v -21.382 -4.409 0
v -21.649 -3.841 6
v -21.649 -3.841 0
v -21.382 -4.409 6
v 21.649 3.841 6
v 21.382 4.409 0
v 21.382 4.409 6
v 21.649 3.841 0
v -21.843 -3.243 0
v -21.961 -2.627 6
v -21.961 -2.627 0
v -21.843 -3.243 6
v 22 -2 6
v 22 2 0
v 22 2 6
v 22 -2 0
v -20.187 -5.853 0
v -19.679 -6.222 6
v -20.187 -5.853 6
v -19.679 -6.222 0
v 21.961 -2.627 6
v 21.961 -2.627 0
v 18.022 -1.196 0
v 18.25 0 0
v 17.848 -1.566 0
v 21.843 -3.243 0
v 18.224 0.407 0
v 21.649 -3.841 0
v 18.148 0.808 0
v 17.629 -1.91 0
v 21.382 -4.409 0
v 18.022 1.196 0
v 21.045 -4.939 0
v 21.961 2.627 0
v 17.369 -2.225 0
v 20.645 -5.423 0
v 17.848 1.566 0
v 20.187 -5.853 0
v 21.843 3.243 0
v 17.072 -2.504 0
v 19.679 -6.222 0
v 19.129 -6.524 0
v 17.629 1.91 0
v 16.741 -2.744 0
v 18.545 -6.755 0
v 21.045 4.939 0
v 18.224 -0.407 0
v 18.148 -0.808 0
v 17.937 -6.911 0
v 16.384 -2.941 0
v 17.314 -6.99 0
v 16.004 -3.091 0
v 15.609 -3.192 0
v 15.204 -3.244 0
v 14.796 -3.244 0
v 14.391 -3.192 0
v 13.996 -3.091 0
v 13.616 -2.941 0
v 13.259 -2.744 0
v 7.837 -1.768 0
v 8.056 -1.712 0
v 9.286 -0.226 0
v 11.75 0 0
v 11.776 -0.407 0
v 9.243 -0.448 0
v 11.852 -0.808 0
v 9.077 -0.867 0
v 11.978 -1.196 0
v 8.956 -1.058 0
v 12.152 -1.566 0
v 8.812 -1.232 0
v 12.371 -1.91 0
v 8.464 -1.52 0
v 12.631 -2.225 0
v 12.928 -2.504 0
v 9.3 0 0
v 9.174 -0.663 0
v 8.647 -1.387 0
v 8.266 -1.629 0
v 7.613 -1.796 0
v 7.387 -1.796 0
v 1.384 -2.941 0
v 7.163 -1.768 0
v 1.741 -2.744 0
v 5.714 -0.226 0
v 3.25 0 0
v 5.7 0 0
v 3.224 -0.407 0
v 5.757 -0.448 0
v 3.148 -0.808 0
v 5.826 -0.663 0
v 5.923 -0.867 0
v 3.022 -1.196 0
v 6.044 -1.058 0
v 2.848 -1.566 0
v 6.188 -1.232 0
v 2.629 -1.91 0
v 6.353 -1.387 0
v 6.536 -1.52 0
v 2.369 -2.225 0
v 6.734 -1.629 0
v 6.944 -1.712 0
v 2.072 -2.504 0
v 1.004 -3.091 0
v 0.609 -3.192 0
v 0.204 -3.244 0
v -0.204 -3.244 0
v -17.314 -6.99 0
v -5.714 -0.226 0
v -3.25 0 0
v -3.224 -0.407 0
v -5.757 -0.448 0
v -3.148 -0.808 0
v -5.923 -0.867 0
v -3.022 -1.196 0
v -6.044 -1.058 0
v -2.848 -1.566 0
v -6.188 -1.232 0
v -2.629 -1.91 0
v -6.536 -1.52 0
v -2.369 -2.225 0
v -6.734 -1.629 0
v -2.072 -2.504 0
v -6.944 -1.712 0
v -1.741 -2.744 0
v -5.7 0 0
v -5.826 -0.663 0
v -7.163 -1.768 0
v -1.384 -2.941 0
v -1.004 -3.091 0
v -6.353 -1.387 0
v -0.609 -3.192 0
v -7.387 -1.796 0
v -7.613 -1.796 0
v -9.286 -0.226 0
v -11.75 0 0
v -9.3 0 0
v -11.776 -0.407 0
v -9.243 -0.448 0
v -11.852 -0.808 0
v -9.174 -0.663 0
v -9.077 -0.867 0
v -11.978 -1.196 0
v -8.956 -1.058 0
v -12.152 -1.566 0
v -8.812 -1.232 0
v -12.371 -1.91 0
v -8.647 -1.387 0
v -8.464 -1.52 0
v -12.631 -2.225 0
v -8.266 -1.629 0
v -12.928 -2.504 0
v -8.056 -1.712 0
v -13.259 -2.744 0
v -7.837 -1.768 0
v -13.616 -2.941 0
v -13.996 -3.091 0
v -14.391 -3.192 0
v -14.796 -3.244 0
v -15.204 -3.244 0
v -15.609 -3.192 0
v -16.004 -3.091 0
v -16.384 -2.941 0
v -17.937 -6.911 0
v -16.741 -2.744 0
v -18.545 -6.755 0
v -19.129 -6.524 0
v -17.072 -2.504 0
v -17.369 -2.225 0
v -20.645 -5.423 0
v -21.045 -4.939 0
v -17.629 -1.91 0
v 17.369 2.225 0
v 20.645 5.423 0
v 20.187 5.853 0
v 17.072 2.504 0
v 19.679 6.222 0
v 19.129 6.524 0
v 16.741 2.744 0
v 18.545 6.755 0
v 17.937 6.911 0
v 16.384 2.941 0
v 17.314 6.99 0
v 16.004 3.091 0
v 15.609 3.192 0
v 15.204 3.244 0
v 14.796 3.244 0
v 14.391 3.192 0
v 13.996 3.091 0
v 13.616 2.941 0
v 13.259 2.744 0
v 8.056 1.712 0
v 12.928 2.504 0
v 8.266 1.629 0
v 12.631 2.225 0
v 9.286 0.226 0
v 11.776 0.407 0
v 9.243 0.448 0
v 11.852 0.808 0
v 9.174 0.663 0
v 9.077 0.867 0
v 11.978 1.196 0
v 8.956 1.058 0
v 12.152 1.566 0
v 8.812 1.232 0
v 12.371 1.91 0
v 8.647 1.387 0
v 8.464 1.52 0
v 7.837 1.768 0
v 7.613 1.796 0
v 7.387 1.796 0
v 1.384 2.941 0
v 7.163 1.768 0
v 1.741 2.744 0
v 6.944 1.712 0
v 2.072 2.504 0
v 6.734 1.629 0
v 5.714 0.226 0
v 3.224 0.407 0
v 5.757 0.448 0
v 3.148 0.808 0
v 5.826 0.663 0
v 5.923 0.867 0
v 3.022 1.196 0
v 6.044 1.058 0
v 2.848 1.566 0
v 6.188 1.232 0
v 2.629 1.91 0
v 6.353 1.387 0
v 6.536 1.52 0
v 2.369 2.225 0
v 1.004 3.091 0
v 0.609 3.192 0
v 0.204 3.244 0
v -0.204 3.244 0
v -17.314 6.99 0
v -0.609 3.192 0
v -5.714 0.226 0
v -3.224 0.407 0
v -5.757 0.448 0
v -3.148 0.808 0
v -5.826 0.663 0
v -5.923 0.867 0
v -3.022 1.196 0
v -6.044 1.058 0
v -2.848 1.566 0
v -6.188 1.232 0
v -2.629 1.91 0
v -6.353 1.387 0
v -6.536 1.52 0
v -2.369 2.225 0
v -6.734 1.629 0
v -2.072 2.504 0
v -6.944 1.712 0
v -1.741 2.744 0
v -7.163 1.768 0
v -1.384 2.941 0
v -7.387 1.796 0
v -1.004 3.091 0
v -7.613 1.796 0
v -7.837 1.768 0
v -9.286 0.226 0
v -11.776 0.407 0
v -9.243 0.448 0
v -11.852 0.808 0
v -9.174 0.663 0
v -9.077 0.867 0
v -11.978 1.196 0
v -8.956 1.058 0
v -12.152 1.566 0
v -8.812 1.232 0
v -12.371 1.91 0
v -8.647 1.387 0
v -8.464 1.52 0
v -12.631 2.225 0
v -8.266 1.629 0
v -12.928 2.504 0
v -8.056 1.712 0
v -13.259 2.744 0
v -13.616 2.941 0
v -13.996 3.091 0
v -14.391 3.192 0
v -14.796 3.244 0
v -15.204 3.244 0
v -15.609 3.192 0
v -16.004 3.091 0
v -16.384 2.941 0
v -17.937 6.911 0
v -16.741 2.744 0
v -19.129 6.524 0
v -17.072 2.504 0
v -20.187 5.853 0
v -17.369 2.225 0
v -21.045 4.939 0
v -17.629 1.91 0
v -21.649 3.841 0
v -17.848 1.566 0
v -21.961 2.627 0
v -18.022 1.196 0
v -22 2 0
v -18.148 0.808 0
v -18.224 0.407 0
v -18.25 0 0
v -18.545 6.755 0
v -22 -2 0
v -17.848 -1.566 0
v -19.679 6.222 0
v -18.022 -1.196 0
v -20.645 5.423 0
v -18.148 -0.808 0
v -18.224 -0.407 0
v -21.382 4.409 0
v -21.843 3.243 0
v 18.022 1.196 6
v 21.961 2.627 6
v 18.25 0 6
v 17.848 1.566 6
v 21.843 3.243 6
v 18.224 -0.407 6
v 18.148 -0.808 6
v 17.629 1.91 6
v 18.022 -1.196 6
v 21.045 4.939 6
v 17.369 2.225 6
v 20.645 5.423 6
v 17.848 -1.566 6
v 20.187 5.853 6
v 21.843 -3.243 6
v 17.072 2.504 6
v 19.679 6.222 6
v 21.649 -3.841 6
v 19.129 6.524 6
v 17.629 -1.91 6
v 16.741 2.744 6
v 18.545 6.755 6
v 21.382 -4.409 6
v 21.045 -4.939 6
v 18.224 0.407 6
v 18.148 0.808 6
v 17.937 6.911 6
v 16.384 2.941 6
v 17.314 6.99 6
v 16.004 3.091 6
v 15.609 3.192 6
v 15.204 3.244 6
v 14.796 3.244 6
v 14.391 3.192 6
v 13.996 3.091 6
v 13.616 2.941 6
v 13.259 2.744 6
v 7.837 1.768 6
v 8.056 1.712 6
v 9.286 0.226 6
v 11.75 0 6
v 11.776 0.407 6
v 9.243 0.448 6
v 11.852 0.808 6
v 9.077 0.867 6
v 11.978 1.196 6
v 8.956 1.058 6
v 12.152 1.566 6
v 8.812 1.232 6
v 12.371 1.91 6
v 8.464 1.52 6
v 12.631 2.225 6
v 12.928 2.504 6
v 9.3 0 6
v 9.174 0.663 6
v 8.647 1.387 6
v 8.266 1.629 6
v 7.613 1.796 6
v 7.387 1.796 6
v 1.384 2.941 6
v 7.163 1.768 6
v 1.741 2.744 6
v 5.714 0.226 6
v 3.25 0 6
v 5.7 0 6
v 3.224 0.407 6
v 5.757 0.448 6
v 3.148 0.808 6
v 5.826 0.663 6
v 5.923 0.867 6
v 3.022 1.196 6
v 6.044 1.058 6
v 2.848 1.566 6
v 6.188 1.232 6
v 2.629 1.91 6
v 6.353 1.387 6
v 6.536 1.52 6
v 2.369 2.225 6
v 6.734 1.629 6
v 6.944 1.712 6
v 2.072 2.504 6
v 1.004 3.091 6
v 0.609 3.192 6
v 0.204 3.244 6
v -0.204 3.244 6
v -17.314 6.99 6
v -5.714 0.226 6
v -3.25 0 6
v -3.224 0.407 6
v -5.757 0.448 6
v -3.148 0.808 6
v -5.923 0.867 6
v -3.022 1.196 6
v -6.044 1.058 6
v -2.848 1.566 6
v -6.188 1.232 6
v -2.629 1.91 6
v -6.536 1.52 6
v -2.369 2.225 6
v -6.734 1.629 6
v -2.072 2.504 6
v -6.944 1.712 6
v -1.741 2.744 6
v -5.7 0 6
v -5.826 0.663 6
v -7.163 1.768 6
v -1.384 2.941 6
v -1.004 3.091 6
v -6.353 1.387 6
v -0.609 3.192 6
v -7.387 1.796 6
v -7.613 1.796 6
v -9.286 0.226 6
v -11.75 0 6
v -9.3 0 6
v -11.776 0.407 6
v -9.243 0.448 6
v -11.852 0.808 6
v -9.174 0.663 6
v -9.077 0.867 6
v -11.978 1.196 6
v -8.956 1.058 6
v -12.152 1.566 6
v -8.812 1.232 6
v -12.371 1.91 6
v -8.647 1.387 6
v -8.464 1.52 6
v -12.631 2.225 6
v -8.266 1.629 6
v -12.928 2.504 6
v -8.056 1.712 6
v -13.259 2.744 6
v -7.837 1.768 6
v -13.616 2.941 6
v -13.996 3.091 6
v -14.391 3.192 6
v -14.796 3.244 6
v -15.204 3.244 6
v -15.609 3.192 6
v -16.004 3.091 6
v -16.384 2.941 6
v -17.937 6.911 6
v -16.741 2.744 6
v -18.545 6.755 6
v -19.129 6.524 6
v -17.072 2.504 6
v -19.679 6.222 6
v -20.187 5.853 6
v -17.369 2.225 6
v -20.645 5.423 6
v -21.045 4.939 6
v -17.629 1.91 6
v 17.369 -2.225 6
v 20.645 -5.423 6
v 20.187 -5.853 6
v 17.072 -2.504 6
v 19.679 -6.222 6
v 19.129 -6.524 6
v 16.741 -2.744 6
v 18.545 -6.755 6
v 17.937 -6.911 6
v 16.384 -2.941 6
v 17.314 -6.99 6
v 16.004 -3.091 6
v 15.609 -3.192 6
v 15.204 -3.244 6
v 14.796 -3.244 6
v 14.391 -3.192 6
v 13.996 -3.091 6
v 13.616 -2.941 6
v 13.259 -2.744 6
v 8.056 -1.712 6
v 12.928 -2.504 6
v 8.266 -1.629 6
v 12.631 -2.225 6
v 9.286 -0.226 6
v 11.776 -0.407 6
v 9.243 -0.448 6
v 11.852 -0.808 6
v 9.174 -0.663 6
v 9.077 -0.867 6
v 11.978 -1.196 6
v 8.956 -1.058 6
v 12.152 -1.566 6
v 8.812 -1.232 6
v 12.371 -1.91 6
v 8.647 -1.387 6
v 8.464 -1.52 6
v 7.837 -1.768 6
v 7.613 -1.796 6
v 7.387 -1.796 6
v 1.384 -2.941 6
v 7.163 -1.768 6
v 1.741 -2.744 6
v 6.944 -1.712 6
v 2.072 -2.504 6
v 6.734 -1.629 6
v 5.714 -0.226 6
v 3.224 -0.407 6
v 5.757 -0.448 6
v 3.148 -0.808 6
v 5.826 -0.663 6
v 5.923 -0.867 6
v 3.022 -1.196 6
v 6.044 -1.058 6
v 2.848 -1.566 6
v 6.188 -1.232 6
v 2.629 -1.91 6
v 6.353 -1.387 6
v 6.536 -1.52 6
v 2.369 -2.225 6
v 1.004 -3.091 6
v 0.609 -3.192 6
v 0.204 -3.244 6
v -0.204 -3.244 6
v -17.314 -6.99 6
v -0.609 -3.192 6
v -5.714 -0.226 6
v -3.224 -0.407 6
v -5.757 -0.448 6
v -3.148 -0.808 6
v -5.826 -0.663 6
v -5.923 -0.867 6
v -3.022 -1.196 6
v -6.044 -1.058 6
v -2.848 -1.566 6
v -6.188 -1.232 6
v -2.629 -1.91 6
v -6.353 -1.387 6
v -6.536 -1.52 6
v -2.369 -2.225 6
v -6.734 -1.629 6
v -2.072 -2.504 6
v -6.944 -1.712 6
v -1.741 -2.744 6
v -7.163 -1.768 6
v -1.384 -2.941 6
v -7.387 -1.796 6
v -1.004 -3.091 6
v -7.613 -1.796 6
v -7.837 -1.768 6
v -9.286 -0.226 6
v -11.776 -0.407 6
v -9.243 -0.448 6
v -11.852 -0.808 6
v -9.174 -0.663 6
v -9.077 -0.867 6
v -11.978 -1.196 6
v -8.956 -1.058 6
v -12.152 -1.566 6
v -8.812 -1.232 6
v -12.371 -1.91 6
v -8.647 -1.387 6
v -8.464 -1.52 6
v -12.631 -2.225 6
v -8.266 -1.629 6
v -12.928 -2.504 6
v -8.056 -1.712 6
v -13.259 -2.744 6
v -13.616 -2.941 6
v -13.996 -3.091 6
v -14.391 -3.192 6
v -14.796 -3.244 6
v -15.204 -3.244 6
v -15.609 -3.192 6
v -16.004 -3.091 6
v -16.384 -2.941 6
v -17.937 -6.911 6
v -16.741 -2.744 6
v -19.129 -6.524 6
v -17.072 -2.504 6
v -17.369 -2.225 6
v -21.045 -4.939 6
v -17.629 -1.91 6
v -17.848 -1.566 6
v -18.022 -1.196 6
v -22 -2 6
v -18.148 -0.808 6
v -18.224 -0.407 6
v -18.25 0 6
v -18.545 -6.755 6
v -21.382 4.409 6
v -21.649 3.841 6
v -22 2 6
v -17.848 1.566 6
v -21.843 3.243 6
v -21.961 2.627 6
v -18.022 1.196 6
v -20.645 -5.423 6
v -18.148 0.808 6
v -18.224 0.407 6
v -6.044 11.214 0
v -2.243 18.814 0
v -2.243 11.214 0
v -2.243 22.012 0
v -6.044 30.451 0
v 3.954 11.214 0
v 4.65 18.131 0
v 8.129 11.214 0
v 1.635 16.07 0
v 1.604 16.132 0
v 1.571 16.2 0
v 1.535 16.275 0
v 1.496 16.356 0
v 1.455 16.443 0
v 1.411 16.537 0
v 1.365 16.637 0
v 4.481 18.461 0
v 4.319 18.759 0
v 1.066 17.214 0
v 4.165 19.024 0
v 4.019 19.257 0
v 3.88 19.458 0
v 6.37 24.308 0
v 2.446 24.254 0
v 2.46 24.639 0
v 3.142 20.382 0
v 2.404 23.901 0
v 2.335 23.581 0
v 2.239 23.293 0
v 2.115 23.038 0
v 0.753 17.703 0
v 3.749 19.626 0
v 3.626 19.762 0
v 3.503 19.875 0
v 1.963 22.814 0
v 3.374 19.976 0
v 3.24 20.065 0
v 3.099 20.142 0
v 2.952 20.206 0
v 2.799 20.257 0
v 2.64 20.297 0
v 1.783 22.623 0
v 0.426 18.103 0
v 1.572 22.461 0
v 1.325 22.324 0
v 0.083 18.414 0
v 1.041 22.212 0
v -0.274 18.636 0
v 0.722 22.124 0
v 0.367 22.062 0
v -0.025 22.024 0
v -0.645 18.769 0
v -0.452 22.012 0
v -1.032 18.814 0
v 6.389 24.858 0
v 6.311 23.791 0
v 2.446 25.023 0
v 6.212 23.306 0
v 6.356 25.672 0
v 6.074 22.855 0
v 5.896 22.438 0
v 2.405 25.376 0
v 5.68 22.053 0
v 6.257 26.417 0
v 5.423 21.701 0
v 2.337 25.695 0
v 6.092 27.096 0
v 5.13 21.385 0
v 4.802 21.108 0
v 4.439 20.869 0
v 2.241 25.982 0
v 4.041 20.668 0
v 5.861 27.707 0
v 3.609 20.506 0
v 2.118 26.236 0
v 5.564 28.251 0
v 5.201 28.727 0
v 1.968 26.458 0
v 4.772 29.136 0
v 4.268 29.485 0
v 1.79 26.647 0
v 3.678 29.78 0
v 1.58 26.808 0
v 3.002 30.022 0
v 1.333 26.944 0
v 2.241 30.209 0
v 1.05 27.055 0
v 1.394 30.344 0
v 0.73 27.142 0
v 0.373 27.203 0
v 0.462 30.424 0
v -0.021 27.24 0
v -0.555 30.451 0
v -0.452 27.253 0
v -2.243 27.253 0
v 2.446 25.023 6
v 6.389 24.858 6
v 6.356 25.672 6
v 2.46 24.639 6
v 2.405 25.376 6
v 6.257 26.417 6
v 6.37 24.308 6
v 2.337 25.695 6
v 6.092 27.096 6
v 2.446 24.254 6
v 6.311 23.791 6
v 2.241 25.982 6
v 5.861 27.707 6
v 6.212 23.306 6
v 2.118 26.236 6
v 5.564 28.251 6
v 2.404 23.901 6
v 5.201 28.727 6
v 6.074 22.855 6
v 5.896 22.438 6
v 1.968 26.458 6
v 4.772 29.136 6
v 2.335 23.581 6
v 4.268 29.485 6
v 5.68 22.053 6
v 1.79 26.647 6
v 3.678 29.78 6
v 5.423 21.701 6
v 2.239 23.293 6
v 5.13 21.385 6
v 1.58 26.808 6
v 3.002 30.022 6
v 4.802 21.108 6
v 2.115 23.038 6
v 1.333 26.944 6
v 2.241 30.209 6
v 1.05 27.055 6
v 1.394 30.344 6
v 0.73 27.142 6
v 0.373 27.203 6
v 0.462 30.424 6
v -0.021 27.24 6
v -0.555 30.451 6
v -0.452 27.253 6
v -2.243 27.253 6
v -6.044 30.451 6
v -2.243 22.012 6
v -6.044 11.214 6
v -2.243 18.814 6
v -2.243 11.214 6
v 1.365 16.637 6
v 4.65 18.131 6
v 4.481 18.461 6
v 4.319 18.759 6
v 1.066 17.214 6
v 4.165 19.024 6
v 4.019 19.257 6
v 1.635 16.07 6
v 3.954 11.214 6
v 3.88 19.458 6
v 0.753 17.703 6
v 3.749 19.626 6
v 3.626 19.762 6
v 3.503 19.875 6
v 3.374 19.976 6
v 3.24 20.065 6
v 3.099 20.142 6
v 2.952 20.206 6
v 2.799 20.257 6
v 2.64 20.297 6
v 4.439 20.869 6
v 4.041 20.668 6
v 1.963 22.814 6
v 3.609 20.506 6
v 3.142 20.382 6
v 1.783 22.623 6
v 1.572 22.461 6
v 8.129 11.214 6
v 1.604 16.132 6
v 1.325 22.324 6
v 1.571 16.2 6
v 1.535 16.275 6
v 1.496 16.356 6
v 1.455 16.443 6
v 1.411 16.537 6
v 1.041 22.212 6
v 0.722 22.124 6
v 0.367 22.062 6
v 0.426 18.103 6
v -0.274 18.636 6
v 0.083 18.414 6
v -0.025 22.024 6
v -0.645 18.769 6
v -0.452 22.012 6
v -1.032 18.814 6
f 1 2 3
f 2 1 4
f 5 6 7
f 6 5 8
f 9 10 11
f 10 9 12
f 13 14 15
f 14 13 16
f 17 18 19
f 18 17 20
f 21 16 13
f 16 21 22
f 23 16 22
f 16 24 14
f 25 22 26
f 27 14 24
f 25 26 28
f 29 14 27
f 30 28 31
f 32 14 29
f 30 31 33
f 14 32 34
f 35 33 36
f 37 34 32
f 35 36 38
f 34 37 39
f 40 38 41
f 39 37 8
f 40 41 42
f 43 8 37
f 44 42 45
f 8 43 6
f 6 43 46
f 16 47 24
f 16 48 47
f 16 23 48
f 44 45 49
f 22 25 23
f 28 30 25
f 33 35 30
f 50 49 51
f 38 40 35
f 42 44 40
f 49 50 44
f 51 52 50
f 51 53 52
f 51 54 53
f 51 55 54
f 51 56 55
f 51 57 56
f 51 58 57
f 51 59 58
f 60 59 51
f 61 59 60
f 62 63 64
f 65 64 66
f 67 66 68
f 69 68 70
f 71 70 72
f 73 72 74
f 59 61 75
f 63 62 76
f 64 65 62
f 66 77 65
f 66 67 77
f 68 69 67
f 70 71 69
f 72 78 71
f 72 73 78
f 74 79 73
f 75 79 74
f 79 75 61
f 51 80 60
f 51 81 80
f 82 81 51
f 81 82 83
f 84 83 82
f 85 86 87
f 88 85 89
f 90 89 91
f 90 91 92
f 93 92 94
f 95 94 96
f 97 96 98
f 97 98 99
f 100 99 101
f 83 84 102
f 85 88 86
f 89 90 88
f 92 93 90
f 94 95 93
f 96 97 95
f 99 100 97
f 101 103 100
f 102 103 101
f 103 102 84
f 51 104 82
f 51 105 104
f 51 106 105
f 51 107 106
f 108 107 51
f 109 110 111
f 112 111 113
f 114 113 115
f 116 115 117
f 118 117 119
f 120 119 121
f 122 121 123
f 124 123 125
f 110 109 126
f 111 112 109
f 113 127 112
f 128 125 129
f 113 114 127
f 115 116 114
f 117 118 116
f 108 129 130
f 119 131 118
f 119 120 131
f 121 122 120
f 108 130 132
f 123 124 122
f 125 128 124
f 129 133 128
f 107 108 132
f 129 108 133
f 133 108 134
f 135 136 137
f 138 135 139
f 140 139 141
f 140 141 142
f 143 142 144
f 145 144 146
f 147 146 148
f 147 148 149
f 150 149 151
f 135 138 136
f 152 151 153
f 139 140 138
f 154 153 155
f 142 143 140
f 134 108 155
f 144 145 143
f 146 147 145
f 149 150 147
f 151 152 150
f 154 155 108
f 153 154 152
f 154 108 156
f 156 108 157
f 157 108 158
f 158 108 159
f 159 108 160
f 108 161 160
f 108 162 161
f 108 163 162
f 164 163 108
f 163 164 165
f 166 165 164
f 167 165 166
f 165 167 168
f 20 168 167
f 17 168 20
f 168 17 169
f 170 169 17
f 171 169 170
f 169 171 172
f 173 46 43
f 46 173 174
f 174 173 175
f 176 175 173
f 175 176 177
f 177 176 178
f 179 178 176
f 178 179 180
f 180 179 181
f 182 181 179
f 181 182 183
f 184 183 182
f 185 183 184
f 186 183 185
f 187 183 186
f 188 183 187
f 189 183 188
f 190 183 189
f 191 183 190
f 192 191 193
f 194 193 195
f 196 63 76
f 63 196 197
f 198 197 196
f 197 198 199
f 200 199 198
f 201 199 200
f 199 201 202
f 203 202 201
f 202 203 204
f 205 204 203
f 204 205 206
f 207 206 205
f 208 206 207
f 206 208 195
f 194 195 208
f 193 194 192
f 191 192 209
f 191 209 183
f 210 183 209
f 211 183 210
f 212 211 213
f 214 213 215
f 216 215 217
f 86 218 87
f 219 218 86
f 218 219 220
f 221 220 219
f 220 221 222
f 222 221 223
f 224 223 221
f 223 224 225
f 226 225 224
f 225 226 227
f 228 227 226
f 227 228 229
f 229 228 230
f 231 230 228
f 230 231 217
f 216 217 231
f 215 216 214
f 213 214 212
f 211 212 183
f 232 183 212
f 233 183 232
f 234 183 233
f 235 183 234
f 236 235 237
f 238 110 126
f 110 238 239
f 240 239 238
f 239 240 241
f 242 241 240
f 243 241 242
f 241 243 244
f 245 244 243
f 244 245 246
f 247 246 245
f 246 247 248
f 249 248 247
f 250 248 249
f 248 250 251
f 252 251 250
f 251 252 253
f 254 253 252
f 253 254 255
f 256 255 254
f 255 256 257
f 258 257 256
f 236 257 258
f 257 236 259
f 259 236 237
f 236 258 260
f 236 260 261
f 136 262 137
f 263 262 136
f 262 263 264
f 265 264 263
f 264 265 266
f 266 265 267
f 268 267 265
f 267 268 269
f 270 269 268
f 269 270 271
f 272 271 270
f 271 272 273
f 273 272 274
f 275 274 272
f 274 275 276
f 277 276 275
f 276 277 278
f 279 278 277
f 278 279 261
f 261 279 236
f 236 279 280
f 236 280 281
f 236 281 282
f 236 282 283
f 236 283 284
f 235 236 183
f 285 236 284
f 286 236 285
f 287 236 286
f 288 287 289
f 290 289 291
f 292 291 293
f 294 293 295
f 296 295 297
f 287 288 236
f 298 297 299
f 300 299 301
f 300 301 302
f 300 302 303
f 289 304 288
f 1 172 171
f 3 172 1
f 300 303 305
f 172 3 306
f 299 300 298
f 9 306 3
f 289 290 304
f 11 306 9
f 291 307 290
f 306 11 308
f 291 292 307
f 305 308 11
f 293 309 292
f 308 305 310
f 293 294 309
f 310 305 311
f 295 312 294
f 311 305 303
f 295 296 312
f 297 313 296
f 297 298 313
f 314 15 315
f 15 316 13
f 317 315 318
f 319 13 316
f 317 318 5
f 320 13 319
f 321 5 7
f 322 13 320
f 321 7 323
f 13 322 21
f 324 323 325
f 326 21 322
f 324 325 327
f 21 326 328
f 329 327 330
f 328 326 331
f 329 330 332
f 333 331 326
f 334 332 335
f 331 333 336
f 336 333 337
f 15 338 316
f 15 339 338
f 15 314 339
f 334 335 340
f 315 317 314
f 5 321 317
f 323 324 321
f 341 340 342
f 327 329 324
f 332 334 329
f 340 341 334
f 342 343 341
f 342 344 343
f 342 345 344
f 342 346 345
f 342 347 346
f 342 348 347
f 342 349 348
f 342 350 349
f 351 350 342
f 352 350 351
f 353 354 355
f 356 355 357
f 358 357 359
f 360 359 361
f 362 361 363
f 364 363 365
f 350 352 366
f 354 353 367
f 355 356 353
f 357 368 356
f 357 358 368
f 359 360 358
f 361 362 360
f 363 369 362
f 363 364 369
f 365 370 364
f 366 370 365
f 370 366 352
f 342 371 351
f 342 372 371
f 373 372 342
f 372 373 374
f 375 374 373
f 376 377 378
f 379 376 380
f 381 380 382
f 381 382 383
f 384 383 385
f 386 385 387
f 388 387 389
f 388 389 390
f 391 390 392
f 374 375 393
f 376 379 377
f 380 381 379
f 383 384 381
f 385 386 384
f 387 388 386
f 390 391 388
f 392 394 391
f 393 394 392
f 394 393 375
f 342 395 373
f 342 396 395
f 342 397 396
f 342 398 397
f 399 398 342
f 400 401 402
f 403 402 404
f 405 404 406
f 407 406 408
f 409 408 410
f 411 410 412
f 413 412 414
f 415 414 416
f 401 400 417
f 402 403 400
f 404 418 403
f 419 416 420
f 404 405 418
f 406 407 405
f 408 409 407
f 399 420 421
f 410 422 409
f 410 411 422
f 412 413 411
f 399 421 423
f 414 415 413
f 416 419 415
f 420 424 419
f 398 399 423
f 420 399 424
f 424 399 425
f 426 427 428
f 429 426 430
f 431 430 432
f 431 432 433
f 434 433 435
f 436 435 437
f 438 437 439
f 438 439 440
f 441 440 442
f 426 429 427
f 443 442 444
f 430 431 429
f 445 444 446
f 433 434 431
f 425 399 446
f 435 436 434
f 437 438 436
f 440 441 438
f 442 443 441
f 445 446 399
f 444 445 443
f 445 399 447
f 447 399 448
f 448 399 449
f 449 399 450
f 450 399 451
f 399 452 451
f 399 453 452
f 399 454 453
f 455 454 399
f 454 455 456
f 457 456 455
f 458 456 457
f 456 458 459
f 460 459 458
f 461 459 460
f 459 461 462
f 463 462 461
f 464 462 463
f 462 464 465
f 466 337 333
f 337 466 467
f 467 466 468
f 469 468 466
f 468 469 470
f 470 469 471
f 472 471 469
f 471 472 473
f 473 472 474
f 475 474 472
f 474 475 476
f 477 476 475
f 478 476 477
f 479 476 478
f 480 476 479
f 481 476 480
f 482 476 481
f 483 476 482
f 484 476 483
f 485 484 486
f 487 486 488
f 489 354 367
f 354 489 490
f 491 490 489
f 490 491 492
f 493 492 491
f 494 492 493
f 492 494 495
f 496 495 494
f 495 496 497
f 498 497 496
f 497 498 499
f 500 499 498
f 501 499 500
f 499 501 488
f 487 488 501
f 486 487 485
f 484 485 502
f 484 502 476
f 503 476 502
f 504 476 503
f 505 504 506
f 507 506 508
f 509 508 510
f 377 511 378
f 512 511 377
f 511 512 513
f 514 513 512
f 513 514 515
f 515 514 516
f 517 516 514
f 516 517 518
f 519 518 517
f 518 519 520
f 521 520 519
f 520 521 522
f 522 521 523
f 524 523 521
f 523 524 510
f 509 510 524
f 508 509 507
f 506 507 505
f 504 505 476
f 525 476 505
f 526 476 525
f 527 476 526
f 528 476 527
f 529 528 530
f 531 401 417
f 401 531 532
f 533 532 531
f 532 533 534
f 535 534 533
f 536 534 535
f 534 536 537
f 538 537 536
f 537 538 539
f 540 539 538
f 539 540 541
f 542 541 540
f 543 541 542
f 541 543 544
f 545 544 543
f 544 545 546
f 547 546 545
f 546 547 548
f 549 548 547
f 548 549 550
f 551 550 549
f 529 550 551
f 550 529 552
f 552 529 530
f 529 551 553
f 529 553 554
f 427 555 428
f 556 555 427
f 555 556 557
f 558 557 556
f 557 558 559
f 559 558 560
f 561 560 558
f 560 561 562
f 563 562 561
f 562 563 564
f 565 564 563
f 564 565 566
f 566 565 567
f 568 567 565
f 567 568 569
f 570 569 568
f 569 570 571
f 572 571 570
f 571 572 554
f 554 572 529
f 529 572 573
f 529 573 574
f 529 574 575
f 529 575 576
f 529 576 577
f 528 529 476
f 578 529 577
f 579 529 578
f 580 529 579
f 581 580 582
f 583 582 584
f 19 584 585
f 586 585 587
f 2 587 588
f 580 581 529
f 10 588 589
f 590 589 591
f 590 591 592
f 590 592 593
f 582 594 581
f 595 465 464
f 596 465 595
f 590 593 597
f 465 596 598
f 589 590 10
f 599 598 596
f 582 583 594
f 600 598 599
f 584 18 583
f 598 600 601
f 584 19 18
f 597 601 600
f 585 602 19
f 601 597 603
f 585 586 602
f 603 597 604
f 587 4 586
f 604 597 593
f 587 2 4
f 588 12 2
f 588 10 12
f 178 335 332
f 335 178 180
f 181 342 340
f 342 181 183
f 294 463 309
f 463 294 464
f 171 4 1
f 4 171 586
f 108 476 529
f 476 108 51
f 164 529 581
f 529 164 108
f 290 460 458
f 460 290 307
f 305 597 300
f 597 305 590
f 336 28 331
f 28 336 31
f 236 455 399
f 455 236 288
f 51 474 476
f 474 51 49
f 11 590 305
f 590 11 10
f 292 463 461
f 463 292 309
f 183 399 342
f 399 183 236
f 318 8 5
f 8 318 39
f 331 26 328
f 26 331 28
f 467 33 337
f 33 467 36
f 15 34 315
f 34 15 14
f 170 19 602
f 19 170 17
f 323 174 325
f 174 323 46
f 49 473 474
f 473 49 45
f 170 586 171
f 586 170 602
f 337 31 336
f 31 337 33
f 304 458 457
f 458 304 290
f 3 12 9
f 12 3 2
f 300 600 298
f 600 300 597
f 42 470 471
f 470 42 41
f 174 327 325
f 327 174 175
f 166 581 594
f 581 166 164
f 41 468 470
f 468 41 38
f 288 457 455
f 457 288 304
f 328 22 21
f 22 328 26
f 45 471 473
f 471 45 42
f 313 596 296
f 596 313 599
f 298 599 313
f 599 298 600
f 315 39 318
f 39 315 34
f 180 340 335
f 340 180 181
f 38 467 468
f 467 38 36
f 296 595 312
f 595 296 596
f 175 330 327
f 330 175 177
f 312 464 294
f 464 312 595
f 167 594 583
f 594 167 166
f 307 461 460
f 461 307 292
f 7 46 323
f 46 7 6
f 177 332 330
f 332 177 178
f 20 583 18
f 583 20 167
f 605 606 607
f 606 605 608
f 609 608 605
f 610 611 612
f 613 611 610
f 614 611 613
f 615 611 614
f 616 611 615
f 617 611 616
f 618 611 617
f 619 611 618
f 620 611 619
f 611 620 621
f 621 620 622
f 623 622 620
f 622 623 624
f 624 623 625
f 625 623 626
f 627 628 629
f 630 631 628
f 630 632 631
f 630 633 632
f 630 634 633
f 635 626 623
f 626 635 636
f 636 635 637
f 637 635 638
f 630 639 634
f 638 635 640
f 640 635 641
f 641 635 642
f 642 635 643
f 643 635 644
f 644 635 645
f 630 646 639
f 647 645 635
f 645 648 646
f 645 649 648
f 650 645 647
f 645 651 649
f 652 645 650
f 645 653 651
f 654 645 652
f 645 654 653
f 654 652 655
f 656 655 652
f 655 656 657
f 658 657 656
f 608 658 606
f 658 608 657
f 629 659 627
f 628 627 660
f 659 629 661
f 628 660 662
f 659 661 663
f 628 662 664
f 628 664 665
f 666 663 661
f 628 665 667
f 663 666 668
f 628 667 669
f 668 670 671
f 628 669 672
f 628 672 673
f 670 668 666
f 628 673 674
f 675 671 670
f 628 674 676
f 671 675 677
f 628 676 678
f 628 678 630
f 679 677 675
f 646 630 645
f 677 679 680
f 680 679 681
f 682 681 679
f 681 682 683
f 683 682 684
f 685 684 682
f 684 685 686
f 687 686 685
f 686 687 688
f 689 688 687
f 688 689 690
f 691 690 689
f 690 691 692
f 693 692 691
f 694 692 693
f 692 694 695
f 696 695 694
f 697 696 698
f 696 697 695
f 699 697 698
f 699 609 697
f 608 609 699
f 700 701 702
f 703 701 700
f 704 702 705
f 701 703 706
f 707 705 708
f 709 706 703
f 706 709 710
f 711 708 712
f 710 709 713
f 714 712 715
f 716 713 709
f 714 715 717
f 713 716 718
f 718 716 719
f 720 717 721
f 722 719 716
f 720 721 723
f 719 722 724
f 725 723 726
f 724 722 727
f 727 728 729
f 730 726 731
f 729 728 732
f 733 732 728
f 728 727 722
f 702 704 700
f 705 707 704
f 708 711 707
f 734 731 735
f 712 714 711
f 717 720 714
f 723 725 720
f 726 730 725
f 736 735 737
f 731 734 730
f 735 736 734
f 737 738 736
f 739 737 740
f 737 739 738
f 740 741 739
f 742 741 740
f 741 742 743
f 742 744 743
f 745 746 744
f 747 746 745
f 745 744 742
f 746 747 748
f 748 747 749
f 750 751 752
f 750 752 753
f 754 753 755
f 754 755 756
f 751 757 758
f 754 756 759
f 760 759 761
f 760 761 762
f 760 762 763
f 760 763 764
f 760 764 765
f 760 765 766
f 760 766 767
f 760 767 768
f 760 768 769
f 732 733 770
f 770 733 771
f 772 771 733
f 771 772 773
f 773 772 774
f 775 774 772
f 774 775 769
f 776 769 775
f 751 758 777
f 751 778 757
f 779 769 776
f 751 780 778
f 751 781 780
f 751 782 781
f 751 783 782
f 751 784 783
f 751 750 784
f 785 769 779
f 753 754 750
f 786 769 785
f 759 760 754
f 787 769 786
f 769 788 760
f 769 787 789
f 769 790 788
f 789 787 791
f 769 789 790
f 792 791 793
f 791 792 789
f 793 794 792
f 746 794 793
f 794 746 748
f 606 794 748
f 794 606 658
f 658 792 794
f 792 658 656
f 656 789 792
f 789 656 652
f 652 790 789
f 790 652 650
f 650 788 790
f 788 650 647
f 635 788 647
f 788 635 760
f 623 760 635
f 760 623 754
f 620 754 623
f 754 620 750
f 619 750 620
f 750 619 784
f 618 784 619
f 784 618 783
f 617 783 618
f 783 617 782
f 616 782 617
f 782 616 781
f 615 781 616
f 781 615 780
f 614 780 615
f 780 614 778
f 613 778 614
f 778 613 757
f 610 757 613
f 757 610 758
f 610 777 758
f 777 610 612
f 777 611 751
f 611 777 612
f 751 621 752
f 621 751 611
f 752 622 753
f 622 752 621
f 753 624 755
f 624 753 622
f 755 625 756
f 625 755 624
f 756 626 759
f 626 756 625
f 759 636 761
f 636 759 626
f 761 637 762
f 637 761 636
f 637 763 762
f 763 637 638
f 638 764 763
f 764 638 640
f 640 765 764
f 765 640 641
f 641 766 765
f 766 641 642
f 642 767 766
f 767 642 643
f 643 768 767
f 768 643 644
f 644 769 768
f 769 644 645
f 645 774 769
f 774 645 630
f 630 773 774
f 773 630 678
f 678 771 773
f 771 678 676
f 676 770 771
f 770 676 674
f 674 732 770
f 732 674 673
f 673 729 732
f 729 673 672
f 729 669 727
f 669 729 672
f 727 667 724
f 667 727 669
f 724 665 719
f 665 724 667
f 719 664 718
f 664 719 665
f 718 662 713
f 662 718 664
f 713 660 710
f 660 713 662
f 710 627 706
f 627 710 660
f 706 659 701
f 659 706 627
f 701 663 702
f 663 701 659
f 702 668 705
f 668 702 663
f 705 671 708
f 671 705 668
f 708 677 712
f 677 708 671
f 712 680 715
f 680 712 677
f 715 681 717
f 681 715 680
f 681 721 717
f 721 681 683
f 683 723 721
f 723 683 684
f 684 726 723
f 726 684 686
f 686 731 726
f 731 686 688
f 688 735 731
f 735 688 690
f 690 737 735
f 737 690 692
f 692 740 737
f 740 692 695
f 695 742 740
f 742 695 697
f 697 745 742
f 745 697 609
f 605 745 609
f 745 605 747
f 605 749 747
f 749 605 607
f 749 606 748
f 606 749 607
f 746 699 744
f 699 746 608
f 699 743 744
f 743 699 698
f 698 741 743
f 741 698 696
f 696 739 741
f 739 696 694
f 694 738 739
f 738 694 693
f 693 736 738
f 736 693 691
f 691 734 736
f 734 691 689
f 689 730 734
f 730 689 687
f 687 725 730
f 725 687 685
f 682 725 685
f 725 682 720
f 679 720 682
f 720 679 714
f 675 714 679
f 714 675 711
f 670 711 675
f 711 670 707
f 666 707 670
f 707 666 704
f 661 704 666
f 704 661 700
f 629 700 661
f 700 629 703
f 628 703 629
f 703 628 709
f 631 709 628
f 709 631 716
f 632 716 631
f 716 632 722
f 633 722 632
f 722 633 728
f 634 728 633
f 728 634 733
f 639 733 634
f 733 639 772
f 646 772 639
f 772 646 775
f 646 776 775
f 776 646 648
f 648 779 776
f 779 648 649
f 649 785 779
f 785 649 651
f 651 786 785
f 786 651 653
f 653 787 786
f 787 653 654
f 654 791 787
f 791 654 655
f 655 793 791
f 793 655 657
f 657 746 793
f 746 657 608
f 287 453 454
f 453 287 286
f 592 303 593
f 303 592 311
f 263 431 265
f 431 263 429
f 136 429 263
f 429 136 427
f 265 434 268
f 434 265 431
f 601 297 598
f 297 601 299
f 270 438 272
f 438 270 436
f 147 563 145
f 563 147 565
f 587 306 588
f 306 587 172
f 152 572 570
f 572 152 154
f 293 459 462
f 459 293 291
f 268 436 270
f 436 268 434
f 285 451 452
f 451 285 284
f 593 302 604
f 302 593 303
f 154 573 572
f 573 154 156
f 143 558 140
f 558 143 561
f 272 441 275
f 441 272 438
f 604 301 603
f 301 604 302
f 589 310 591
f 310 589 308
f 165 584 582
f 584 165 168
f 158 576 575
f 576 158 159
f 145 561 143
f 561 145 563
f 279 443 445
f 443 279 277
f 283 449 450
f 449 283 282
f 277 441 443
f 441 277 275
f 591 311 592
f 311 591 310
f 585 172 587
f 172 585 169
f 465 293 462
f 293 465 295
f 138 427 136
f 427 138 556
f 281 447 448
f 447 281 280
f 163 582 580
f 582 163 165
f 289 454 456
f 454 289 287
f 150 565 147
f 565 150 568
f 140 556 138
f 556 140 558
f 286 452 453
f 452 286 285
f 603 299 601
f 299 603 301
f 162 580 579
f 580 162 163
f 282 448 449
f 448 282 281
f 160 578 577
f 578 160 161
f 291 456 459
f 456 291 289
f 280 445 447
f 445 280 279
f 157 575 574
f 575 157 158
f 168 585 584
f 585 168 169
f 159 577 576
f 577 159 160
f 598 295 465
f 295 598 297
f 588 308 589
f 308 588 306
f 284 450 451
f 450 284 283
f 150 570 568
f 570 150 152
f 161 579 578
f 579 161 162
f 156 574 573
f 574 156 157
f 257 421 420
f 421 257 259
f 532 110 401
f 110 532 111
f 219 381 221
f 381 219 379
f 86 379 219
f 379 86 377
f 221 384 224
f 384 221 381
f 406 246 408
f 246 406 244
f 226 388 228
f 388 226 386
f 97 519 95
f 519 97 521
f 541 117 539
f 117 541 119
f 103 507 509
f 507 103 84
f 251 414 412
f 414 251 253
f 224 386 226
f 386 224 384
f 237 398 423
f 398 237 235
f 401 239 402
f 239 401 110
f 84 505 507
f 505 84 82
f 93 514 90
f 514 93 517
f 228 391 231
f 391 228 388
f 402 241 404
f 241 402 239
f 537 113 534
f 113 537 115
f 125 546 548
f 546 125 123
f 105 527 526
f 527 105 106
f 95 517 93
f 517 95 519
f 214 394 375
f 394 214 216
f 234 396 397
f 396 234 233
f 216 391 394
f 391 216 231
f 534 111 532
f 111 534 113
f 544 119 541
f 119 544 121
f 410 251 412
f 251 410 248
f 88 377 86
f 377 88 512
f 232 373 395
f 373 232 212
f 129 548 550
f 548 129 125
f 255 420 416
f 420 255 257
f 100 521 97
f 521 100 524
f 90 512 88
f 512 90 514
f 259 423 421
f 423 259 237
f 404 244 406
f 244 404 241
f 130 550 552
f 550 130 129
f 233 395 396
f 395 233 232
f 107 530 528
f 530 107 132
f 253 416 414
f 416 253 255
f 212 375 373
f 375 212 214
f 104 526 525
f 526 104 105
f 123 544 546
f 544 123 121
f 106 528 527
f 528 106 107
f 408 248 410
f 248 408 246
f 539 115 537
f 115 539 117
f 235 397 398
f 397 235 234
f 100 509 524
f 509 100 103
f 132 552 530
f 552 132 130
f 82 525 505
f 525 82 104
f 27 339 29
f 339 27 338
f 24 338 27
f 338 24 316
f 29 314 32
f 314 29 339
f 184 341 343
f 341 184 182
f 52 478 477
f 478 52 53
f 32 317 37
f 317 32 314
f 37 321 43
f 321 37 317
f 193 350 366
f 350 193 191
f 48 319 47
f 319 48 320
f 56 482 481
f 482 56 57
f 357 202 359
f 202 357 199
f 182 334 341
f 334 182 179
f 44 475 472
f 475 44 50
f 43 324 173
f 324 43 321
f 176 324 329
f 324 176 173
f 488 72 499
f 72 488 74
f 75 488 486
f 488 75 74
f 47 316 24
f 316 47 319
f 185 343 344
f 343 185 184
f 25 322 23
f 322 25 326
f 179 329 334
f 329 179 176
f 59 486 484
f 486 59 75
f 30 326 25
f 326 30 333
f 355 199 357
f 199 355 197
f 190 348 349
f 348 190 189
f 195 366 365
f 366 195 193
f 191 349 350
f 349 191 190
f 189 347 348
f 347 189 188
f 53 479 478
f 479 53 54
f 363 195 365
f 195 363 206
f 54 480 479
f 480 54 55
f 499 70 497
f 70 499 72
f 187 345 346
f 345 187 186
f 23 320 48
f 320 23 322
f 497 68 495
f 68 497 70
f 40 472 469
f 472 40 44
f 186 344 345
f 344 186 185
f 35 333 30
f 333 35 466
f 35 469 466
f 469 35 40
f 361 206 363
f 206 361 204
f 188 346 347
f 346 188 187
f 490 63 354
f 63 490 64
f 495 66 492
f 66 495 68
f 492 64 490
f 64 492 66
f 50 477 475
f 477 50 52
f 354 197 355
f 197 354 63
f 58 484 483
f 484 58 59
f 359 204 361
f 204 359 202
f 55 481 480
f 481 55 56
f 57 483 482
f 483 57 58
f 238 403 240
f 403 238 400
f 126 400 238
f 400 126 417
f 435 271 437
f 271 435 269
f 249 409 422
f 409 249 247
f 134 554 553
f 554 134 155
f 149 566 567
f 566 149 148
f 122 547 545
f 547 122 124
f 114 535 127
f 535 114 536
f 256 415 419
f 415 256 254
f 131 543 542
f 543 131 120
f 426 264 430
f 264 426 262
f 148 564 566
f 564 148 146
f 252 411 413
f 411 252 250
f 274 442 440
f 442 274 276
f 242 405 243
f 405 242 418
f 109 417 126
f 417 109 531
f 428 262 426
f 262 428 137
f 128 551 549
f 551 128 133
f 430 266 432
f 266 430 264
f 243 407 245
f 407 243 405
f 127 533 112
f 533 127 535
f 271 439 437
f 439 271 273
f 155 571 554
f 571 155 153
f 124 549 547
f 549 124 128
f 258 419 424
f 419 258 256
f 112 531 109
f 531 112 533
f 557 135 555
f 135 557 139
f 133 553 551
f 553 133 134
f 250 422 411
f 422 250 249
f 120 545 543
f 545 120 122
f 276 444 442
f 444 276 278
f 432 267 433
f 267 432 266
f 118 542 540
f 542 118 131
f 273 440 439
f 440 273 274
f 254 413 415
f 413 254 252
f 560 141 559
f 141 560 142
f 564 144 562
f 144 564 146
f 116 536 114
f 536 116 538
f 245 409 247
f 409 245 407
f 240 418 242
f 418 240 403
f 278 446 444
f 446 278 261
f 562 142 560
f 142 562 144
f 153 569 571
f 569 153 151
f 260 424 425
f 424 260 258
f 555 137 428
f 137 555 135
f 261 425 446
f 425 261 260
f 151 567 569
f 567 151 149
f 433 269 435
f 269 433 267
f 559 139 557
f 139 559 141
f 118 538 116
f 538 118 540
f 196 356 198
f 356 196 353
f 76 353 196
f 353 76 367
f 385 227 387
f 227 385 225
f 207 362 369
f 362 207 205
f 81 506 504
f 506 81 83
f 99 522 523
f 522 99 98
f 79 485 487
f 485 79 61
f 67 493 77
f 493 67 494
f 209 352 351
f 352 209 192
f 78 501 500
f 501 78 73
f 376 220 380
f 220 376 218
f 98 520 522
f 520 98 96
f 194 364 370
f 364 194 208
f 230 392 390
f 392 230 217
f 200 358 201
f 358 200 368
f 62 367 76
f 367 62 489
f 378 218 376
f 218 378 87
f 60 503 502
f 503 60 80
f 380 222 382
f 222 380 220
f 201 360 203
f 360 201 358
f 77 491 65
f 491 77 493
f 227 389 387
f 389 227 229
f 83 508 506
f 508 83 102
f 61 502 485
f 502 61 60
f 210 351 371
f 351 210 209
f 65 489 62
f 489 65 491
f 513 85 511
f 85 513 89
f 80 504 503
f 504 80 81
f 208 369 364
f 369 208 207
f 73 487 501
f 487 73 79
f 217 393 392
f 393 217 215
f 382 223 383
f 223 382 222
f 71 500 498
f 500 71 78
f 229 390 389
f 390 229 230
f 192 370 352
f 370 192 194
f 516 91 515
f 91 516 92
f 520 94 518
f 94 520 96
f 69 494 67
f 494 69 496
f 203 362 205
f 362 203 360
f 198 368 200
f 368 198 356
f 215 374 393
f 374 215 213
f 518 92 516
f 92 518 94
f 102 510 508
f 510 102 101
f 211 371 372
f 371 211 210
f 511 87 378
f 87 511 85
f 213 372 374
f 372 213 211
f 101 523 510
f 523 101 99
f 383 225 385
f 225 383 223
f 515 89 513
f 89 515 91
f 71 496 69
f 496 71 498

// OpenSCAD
$fn = 50;


difference() {
	union() {
		hull() {
			translate(v = [-17.0000000000, 2.0000000000, 0]) {
				cylinder(h = 6, r = 5);
			}
			translate(v = [17.0000000000, 2.0000000000, 0]) {
				cylinder(h = 6, r = 5);
			}
			translate(v = [-17.0000000000, -2.0000000000, 0]) {
				cylinder(h = 6, r = 5);
			}
			translate(v = [17.0000000000, -2.0000000000, 0]) {
				cylinder(h = 6, r = 5);
			}
		}
		translate(v = [0, 30.0000000000, 0]) {
			linear_extrude(height = 6) {
				text(font = "DejaVu Sans Mono:style=Bold", halign = "center", size = 19.0000000000, text = "R", valign = "top");
			}
		}
	}
	union() {
		translate(v = [-15.0000000000, 0.0000000000, 0]) {
			translate(v = [0, 0, -100]) {
				cylinder(h = 200, r = 3.2500000000);
			}
		}
		translate(v = [0, 0, -100]) {
			cylinder(h = 200, r = 3.2500000000);
		}
		translate(v = [15.0000000000, 0.0000000000, 0]) {
			translate(v = [0, 0, -100]) {
				cylinder(h = 200, r = 3.2500000000);
			}
		}
		translate(v = [-15.0000000000, 0.0000000000, 0]) {
			translate(v = [0, 0, -100]) {
				cylinder(h = 200, r = 1.8000000000);
			}
		}
		translate(v = [-7.5000000000, 0.0000000000, 0]) {
			translate(v = [0, 0, -100]) {
				cylinder(h = 200, r = 1.8000000000);
			}
		}
		translate(v = [0, 0, -100]) {
			cylinder(h = 200, r = 1.8000000000);
		}
		translate(v = [7.5000000000, 0.0000000000, 0]) {
			translate(v = [0, 0, -100]) {
				cylinder(h = 200, r = 1.8000000000);
			}
		}
		translate(v = [15.0000000000, 0.0000000000, 0]) {
			translate(v = [0, 0, -100]) {
				cylinder(h = 200, r = 1.8000000000);
			}
		}
	}
}
